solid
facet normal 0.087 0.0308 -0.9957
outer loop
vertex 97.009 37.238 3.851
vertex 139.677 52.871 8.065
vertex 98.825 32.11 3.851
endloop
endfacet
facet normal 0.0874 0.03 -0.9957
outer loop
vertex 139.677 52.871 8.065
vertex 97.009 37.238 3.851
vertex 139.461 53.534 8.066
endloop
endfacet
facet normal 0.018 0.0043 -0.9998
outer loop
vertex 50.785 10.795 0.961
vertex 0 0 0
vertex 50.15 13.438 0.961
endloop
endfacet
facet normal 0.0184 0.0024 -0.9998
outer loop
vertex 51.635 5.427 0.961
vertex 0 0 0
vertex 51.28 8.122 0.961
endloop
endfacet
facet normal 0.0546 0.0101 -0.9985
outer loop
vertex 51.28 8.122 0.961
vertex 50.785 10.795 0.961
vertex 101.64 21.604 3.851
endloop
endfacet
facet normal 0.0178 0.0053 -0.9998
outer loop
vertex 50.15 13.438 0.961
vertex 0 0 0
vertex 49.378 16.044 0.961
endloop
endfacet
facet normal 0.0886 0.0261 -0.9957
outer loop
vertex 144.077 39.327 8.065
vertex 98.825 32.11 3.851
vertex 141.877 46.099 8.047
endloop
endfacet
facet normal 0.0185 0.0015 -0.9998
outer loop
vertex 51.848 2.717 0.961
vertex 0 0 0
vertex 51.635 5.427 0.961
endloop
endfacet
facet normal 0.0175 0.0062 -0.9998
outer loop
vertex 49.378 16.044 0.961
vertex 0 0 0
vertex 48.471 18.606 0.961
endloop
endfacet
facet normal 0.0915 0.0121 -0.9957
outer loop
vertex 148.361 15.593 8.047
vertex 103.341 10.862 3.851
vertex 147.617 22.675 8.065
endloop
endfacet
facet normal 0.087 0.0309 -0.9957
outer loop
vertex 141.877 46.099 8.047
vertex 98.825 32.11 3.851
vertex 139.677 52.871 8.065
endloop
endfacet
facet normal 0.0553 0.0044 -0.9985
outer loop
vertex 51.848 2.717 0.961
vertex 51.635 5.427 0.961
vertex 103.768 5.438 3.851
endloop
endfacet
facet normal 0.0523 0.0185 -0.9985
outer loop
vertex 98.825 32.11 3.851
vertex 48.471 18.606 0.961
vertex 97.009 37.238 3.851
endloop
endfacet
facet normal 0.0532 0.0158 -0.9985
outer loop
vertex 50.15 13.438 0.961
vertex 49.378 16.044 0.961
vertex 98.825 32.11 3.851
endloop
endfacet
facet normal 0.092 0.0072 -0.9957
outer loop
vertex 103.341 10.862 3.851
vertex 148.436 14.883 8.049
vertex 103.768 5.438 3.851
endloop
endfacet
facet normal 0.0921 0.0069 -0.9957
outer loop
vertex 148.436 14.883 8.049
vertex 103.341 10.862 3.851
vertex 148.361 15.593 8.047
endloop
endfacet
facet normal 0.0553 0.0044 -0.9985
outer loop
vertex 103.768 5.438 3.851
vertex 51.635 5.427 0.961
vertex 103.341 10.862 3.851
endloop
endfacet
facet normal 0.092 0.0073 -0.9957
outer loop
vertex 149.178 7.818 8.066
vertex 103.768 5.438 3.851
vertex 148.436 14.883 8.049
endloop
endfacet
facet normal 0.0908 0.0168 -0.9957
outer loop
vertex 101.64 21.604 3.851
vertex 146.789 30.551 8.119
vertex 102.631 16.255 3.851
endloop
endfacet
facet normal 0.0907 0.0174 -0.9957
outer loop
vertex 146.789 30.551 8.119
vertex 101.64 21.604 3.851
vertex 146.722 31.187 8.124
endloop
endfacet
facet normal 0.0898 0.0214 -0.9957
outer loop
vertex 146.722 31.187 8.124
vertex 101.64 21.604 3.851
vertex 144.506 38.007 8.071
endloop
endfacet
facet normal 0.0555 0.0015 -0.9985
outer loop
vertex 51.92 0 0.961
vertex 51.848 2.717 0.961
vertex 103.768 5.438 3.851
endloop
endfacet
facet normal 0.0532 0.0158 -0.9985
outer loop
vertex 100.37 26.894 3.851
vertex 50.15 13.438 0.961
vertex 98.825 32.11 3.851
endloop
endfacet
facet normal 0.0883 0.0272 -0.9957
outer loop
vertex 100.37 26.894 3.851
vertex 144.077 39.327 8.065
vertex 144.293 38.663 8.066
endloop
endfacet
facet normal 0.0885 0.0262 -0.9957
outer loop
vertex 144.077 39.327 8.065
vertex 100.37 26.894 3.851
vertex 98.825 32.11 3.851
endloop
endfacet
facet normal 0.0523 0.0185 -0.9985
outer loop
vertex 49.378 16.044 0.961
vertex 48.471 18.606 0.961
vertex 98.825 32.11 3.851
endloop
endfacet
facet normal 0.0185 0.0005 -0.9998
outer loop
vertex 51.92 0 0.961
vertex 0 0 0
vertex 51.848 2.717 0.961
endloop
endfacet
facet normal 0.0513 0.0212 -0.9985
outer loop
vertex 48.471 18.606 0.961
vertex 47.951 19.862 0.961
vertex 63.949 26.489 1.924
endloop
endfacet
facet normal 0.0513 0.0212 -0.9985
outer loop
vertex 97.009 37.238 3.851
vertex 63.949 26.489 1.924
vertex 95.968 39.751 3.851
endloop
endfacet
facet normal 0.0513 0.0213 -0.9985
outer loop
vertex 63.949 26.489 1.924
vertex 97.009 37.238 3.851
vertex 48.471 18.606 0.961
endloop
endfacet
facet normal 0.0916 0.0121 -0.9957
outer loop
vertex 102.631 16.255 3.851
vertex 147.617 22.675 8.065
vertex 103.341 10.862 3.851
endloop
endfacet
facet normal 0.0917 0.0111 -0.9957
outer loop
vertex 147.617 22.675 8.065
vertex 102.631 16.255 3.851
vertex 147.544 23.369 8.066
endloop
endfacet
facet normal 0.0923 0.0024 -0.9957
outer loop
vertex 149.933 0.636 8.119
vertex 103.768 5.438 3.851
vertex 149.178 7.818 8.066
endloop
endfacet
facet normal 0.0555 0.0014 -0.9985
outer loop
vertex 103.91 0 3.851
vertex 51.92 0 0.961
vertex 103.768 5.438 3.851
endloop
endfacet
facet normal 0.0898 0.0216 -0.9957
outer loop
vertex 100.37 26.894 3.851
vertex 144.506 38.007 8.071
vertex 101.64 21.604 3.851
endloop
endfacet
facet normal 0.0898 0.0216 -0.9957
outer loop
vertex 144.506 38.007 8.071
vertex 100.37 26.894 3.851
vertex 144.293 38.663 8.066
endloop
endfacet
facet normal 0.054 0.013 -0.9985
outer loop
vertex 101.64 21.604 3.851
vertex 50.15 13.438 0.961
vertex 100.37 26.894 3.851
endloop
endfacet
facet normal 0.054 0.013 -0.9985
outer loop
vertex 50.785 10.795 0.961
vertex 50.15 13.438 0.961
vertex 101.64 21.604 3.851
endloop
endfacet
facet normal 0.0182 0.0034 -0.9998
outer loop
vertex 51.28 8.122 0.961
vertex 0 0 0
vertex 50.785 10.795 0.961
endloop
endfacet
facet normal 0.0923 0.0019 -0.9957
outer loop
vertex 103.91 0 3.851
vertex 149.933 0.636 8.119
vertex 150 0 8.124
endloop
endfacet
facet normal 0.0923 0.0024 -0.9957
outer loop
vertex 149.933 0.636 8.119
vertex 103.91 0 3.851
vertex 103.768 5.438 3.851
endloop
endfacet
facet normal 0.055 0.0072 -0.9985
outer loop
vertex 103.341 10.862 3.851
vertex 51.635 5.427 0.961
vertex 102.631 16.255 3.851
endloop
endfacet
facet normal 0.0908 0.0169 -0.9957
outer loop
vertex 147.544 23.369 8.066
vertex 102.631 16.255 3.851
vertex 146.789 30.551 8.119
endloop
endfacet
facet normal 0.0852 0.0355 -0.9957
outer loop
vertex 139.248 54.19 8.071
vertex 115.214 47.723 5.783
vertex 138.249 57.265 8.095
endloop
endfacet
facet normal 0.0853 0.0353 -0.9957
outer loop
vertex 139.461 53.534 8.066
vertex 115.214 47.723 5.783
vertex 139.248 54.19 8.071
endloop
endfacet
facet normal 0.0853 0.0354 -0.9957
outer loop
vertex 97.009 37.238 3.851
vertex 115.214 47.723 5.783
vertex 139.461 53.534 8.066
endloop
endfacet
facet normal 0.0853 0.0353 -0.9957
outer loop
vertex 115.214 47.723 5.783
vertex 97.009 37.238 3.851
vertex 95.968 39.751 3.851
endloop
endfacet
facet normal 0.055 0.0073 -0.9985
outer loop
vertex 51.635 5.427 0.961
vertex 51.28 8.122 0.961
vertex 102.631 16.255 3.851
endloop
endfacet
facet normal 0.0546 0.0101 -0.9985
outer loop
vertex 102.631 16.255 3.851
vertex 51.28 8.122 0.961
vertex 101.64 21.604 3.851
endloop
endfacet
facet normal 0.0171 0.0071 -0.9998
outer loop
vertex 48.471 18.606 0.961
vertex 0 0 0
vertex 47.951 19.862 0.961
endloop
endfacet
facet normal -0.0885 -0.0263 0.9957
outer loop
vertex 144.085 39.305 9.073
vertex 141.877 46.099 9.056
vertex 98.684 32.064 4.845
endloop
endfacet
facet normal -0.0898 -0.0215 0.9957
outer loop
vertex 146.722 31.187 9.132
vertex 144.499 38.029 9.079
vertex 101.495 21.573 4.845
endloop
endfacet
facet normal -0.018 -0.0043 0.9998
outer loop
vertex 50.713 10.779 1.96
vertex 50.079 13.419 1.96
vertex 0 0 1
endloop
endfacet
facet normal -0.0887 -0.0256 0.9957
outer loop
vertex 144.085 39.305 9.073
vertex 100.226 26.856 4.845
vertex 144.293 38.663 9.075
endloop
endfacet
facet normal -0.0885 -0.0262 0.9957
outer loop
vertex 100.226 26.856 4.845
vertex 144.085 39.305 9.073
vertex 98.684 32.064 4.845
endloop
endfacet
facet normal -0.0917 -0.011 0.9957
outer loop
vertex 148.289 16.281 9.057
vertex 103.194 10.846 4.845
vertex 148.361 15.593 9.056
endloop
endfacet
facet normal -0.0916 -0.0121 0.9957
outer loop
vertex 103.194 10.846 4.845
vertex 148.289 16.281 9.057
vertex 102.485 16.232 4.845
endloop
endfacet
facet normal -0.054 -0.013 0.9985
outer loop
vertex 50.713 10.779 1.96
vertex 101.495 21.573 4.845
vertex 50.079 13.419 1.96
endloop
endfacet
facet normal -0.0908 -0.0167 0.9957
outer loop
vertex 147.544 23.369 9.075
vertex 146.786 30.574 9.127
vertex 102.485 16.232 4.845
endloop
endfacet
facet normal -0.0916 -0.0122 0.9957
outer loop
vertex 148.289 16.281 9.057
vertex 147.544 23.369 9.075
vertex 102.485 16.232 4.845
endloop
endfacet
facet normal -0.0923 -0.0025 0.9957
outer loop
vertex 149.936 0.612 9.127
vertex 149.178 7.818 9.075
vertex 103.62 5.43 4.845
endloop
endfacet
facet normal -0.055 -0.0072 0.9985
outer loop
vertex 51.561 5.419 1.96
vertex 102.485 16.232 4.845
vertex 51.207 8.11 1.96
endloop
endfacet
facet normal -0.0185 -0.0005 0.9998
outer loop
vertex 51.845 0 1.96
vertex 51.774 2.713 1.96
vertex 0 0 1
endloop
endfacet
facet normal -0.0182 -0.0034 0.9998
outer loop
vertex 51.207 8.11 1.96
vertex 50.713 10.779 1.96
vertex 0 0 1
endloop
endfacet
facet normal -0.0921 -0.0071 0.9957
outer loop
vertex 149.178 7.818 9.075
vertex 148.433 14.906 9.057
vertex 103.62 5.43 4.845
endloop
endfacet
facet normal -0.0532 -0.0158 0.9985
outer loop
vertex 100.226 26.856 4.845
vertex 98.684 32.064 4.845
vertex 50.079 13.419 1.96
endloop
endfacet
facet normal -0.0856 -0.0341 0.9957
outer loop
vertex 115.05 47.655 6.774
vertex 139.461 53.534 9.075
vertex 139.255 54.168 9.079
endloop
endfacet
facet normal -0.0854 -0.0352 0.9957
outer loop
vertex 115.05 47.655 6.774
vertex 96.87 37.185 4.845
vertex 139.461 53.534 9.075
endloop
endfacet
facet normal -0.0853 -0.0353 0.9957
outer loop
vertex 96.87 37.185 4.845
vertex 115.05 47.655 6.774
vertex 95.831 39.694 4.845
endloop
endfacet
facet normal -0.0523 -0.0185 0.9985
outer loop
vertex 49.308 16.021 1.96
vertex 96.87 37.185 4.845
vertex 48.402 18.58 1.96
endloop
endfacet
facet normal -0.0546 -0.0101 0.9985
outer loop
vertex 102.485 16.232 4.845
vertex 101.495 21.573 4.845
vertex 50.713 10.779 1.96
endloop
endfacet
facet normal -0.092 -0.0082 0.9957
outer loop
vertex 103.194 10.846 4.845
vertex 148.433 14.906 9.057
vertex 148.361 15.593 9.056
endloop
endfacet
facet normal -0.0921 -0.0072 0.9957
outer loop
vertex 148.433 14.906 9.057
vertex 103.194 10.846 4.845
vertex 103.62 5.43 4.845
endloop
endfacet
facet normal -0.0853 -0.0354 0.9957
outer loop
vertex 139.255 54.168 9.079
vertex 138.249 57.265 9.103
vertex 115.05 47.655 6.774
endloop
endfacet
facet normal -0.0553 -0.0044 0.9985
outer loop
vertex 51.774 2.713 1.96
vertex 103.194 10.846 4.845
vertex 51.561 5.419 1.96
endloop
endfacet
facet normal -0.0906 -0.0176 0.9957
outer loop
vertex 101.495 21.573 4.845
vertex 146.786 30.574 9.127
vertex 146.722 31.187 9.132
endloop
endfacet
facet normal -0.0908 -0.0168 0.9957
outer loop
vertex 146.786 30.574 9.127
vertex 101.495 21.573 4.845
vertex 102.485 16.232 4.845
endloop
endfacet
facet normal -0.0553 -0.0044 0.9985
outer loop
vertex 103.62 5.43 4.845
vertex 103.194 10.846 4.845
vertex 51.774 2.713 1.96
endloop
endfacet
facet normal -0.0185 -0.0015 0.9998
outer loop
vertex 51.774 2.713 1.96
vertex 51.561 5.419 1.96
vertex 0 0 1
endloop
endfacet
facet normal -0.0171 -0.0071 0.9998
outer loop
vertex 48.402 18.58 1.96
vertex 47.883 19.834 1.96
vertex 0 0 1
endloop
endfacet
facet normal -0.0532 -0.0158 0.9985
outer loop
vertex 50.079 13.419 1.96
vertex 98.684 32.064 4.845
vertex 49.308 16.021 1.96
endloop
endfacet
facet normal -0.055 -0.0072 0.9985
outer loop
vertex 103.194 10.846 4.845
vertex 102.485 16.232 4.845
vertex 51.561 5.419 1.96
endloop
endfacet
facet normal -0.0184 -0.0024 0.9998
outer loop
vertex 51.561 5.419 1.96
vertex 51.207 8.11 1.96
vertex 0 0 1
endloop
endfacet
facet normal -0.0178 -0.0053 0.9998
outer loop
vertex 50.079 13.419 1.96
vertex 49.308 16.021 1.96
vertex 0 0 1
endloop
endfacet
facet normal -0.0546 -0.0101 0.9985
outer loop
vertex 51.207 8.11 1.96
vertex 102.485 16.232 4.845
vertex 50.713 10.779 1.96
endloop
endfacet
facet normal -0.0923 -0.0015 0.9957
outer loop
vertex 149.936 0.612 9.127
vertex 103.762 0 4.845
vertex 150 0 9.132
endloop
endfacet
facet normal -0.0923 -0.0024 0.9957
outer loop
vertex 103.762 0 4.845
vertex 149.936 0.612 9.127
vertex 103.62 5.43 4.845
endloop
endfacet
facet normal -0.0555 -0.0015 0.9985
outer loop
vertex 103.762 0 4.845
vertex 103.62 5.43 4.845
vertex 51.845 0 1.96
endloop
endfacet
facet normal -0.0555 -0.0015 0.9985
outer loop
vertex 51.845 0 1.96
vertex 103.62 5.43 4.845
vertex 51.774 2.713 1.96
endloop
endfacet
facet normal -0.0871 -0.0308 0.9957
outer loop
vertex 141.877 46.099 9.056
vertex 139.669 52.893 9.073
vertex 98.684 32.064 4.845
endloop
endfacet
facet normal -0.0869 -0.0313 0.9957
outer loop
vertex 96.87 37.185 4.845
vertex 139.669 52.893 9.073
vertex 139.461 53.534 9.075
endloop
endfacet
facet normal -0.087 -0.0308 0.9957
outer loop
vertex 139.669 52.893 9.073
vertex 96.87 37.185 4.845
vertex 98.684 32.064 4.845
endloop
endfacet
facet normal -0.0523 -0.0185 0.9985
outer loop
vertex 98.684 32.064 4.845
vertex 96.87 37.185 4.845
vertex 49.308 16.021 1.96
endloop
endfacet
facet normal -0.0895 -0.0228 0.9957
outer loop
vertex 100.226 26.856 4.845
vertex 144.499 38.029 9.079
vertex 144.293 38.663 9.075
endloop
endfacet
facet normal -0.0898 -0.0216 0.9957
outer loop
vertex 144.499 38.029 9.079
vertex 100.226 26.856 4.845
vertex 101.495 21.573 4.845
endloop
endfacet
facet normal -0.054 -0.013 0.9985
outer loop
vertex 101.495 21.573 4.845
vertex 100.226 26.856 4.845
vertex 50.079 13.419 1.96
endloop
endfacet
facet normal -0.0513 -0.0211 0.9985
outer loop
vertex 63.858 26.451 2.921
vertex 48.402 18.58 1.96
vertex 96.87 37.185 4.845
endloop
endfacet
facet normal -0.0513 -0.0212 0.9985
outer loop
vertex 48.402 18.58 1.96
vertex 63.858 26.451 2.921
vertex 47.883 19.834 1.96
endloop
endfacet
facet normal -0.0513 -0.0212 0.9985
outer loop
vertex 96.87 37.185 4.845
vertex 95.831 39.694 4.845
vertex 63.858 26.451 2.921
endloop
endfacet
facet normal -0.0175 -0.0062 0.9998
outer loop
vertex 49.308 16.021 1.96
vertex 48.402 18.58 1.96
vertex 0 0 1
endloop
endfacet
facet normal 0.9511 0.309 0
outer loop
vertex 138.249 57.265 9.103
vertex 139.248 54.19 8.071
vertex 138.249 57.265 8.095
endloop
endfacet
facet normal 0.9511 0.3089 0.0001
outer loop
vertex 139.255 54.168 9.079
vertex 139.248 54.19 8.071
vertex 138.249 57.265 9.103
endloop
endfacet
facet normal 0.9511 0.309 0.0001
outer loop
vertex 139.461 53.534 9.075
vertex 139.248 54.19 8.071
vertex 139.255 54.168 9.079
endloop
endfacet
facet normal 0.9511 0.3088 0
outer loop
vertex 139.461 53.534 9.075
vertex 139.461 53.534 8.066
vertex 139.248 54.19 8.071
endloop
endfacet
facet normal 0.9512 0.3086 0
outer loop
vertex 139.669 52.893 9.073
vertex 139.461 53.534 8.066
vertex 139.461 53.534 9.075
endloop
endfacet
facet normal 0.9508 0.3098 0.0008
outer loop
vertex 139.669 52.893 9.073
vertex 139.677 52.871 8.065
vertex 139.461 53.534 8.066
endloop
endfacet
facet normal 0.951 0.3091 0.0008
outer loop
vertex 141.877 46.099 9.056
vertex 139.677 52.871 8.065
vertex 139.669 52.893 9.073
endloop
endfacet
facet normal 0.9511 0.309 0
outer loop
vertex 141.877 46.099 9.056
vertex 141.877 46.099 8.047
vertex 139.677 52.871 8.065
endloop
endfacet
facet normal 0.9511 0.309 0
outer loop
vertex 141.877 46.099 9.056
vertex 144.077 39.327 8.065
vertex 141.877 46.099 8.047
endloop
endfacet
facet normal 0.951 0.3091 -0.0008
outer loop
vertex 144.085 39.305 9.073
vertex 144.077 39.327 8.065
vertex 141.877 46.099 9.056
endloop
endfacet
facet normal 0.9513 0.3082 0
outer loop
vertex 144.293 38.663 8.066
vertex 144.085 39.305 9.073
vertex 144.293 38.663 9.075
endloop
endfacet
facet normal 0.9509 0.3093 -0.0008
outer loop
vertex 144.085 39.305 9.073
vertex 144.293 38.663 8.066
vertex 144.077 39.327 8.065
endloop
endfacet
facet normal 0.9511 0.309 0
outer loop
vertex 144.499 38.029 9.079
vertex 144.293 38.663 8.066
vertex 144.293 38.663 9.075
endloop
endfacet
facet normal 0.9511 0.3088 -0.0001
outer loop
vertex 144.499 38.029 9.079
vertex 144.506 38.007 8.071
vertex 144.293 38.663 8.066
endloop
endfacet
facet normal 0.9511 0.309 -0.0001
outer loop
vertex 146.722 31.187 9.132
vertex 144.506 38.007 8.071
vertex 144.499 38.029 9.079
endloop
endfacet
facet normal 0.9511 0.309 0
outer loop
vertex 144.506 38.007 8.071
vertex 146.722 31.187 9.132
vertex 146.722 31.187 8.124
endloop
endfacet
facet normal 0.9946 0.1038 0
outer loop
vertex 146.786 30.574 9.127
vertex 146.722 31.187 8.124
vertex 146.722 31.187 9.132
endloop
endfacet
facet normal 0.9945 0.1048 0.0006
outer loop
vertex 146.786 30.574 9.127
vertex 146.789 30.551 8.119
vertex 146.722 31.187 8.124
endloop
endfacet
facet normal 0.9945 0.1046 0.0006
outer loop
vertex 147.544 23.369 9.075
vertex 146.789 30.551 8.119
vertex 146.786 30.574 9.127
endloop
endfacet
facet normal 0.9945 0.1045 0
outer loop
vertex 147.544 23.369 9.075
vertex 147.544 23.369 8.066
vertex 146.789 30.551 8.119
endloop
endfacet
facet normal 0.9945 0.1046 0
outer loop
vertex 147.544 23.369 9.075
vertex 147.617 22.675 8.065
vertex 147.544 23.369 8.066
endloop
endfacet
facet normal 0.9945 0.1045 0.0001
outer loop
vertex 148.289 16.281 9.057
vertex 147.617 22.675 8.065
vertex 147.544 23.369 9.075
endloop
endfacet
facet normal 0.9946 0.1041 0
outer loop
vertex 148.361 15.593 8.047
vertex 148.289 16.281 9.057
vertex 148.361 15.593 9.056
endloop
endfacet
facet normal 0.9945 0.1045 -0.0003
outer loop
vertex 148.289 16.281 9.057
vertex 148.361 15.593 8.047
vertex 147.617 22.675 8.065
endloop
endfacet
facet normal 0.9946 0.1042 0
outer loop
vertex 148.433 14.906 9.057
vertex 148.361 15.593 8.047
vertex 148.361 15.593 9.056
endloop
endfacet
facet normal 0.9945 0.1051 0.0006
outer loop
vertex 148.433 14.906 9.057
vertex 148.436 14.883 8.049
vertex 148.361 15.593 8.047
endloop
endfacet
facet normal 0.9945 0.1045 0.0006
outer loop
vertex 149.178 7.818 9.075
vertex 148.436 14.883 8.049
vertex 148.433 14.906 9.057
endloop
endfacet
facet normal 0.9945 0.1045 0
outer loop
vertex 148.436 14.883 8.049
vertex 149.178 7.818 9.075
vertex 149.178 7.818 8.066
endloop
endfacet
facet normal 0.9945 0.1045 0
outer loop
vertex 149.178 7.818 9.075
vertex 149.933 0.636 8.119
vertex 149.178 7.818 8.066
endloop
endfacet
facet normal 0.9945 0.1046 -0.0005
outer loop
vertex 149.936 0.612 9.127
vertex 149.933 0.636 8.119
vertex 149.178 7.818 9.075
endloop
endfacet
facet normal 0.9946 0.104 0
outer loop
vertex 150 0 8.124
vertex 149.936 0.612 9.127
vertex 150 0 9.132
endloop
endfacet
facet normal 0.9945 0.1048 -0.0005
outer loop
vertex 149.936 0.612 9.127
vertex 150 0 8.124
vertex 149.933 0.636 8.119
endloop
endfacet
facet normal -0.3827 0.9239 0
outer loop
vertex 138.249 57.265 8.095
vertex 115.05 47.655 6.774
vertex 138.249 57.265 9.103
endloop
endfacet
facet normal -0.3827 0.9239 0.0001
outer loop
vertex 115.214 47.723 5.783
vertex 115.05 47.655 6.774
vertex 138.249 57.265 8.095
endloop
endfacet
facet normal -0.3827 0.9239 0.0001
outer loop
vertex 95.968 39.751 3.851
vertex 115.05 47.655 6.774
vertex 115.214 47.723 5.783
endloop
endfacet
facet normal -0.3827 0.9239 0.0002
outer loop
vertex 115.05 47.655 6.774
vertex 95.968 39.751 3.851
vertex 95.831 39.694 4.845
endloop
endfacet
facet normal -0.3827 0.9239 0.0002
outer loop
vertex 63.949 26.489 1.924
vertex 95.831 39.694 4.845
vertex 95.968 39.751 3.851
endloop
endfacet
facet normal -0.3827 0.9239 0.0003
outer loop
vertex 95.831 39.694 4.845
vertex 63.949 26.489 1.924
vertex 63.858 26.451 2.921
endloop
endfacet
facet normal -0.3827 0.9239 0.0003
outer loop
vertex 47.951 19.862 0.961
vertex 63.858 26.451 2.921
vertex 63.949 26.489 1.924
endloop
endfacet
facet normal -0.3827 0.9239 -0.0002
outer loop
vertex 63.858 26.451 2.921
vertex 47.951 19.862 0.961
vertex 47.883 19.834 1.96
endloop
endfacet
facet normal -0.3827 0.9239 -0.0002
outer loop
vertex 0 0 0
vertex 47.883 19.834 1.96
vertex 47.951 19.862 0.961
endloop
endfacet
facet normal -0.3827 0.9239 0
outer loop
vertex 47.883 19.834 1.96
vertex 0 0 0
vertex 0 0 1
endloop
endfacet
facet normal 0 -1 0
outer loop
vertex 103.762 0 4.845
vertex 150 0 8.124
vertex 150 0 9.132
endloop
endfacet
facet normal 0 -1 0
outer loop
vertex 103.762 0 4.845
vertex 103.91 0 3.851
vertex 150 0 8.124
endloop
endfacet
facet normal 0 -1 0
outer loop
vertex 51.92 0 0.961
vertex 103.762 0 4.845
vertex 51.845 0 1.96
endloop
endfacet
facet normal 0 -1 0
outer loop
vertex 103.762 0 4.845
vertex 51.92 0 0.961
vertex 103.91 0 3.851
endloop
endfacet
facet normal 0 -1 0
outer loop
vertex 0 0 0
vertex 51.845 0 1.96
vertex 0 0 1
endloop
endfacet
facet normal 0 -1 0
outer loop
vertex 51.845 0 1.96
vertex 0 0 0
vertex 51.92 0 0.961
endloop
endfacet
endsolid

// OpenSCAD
//////////////////////////////////////////////////////////////////////////////////////////////
// Paraboloid module for OpenScad
//
// Copyright (C) 2013  Lochner, Juergen
// http://www.thingiverse.com/Ablapo/designs
//
// This program is free software. It is 
// licensed under the Attribution - Creative Commons license.
// http://creativecommons.org/licenses/by/3.0/
//////////////////////////////////////////////////////////////////////////////////////////////

use <MCAD/2Dshapes.scad>;
module paraboloid (y=10, f=5, rfa=0, fc=1, detail=44){
	// y = height of paraboloid
	// f = focus distance 
	// fc : 1 = center paraboloid in focus point(x=0, y=f); 0 = center paraboloid on top (x=0, y=0)
	// rfa = radius of the focus area : 0 = point focus
	// detail = $fn of cone

	hi = (y+2*f)/sqrt(2);								// height and radius of the cone -> alpha = 45° -> sin(45°)=1/sqrt(2)
	x =2*f*sqrt(y/f);									// x  = half size of parabola
	
   translate([0,0,-f*fc])								// center on focus 
	rotate_extrude(convexity = 10,$fn=detail )		// extrude paraboild
	translate([rfa,0,0])								// translate for focus area	 
	difference(){
		union(){											// adding square for focal area
			projection(cut = true)																			// reduce from 3D cone to 2D parabola
				translate([0,0,f*2]) rotate([45,0,0])													// rotate cone 45° and translate for cutting
				translate([0,0,-hi/2])cylinder(h= hi, r1=hi, r2=0, center=true, $fn=detail);   	// center cone on tip
			translate([-(rfa+x ),0]) square ([rfa+x , y ]);											// focal area square
		}
		translate([-(2*rfa+x ), -1/2]) square ([rfa+x ,y +1] ); 					// cut of half at rotation center 
	}
}

size=120; // was 130
fh = 700;

module dish(size, focusHeight) {
    translate([0, 0, fh+1])
        difference() {
            color("green") paraboloid (y=size,f=fh+1,rfa= 0,fc=1,detail=120);
            paraboloid (y=size,f=fh,rfa= 0,fc=1,detail=120);
        }
}

intersection() {
    intersection() {
        dish(size, fh);
        cylinder(r=150, h=160, center = true);
    }
    linear_extrude(122) pieSlice(size=600, start_angle=0, end_angle=22.5);
}

//color("blue") translate([0, 0, fh]) sphere(r=50);
//linear_extrude(122) pieSlice(size=600, start_angle=0, end_angle=45);
